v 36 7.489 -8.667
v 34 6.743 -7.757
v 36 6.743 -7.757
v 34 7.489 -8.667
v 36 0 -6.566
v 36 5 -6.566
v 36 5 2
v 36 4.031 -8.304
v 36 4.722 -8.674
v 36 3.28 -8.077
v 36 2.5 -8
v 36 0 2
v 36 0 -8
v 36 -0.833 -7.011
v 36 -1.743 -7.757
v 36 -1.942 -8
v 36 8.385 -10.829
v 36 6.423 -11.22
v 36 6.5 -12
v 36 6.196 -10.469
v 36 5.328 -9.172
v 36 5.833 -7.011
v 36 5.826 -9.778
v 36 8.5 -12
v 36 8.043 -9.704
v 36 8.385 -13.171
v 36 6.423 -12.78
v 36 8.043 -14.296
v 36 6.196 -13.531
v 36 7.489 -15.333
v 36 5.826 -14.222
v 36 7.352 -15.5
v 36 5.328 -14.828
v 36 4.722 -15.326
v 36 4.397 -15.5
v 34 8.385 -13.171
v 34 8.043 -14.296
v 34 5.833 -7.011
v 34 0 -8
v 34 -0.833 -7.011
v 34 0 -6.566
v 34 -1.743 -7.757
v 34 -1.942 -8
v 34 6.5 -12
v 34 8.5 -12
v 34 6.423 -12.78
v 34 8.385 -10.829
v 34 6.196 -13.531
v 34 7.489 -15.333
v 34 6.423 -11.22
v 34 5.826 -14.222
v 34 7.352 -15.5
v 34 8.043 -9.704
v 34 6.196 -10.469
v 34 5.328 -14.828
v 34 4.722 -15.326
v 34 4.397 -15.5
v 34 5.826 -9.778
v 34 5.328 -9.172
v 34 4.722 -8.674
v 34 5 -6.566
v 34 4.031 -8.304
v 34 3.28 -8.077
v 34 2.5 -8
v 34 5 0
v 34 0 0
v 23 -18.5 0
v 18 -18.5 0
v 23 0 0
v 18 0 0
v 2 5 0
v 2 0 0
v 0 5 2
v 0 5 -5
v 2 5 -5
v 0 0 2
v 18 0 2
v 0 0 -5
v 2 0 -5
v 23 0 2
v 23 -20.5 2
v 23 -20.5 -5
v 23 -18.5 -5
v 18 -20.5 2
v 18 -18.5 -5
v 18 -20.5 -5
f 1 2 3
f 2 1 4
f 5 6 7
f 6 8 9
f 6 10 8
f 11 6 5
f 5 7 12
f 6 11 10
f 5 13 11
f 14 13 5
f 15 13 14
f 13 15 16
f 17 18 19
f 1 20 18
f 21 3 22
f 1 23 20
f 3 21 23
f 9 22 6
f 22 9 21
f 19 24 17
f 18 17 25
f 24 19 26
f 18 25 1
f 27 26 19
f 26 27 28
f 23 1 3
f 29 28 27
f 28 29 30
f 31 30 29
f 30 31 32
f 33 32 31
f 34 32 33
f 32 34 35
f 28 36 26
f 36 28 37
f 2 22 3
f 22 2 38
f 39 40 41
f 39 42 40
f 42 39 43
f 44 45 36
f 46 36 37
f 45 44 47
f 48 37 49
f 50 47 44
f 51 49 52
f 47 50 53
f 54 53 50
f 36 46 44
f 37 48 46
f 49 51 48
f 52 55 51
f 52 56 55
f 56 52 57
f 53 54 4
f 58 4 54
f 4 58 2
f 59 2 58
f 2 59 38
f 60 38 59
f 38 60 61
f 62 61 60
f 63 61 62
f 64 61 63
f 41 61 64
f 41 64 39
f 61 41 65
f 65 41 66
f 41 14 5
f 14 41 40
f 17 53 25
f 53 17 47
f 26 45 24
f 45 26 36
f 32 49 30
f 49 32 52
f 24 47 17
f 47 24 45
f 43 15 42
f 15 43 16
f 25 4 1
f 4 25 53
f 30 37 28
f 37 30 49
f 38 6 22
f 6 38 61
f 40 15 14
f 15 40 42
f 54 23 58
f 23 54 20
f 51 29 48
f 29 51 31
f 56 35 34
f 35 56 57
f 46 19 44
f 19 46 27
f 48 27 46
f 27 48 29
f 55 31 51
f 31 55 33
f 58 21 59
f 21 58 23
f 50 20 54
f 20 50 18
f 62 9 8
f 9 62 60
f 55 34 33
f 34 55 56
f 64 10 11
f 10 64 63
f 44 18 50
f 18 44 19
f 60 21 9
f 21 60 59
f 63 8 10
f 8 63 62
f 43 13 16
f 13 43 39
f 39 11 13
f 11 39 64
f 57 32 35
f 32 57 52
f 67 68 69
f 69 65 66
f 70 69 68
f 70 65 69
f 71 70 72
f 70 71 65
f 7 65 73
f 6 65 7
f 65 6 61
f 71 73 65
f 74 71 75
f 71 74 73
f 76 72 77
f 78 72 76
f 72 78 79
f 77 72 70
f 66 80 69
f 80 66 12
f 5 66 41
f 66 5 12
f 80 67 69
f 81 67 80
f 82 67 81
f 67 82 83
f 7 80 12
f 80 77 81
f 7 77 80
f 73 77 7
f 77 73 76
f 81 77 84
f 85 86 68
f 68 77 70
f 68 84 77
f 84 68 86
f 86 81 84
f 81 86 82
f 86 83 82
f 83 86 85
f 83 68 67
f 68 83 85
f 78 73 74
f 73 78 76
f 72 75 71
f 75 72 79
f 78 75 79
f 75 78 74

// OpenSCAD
$fn=32;

// lang X
cube([36,5,2]);
// nedoverstart 
translate([0,0,-5])
    cube([2,5,5]);
// nedoverslutt
translate([34,0,-8]) {
    cube([2,5,8]);
    rotate([0,90,0]) {
        translate([4,2.5,0]) {
            difference() {
                cylinder(d=12,h=2);
                cylinder(d=8,h=2);
                translate([-4,-6,-0]) {
                    cube([10,6,2]);
                }
                translate([3.5,-5,0]) {
                    cube([6,11,2]);
                }
            }
        }
    }
}
// venstre
translate([18,-20.5,0]) {
    cube([5,20.5,2]);
    //nedovervenstre
    translate([0,0,-5]) {
        cube([5,2,5]);
    }
}
